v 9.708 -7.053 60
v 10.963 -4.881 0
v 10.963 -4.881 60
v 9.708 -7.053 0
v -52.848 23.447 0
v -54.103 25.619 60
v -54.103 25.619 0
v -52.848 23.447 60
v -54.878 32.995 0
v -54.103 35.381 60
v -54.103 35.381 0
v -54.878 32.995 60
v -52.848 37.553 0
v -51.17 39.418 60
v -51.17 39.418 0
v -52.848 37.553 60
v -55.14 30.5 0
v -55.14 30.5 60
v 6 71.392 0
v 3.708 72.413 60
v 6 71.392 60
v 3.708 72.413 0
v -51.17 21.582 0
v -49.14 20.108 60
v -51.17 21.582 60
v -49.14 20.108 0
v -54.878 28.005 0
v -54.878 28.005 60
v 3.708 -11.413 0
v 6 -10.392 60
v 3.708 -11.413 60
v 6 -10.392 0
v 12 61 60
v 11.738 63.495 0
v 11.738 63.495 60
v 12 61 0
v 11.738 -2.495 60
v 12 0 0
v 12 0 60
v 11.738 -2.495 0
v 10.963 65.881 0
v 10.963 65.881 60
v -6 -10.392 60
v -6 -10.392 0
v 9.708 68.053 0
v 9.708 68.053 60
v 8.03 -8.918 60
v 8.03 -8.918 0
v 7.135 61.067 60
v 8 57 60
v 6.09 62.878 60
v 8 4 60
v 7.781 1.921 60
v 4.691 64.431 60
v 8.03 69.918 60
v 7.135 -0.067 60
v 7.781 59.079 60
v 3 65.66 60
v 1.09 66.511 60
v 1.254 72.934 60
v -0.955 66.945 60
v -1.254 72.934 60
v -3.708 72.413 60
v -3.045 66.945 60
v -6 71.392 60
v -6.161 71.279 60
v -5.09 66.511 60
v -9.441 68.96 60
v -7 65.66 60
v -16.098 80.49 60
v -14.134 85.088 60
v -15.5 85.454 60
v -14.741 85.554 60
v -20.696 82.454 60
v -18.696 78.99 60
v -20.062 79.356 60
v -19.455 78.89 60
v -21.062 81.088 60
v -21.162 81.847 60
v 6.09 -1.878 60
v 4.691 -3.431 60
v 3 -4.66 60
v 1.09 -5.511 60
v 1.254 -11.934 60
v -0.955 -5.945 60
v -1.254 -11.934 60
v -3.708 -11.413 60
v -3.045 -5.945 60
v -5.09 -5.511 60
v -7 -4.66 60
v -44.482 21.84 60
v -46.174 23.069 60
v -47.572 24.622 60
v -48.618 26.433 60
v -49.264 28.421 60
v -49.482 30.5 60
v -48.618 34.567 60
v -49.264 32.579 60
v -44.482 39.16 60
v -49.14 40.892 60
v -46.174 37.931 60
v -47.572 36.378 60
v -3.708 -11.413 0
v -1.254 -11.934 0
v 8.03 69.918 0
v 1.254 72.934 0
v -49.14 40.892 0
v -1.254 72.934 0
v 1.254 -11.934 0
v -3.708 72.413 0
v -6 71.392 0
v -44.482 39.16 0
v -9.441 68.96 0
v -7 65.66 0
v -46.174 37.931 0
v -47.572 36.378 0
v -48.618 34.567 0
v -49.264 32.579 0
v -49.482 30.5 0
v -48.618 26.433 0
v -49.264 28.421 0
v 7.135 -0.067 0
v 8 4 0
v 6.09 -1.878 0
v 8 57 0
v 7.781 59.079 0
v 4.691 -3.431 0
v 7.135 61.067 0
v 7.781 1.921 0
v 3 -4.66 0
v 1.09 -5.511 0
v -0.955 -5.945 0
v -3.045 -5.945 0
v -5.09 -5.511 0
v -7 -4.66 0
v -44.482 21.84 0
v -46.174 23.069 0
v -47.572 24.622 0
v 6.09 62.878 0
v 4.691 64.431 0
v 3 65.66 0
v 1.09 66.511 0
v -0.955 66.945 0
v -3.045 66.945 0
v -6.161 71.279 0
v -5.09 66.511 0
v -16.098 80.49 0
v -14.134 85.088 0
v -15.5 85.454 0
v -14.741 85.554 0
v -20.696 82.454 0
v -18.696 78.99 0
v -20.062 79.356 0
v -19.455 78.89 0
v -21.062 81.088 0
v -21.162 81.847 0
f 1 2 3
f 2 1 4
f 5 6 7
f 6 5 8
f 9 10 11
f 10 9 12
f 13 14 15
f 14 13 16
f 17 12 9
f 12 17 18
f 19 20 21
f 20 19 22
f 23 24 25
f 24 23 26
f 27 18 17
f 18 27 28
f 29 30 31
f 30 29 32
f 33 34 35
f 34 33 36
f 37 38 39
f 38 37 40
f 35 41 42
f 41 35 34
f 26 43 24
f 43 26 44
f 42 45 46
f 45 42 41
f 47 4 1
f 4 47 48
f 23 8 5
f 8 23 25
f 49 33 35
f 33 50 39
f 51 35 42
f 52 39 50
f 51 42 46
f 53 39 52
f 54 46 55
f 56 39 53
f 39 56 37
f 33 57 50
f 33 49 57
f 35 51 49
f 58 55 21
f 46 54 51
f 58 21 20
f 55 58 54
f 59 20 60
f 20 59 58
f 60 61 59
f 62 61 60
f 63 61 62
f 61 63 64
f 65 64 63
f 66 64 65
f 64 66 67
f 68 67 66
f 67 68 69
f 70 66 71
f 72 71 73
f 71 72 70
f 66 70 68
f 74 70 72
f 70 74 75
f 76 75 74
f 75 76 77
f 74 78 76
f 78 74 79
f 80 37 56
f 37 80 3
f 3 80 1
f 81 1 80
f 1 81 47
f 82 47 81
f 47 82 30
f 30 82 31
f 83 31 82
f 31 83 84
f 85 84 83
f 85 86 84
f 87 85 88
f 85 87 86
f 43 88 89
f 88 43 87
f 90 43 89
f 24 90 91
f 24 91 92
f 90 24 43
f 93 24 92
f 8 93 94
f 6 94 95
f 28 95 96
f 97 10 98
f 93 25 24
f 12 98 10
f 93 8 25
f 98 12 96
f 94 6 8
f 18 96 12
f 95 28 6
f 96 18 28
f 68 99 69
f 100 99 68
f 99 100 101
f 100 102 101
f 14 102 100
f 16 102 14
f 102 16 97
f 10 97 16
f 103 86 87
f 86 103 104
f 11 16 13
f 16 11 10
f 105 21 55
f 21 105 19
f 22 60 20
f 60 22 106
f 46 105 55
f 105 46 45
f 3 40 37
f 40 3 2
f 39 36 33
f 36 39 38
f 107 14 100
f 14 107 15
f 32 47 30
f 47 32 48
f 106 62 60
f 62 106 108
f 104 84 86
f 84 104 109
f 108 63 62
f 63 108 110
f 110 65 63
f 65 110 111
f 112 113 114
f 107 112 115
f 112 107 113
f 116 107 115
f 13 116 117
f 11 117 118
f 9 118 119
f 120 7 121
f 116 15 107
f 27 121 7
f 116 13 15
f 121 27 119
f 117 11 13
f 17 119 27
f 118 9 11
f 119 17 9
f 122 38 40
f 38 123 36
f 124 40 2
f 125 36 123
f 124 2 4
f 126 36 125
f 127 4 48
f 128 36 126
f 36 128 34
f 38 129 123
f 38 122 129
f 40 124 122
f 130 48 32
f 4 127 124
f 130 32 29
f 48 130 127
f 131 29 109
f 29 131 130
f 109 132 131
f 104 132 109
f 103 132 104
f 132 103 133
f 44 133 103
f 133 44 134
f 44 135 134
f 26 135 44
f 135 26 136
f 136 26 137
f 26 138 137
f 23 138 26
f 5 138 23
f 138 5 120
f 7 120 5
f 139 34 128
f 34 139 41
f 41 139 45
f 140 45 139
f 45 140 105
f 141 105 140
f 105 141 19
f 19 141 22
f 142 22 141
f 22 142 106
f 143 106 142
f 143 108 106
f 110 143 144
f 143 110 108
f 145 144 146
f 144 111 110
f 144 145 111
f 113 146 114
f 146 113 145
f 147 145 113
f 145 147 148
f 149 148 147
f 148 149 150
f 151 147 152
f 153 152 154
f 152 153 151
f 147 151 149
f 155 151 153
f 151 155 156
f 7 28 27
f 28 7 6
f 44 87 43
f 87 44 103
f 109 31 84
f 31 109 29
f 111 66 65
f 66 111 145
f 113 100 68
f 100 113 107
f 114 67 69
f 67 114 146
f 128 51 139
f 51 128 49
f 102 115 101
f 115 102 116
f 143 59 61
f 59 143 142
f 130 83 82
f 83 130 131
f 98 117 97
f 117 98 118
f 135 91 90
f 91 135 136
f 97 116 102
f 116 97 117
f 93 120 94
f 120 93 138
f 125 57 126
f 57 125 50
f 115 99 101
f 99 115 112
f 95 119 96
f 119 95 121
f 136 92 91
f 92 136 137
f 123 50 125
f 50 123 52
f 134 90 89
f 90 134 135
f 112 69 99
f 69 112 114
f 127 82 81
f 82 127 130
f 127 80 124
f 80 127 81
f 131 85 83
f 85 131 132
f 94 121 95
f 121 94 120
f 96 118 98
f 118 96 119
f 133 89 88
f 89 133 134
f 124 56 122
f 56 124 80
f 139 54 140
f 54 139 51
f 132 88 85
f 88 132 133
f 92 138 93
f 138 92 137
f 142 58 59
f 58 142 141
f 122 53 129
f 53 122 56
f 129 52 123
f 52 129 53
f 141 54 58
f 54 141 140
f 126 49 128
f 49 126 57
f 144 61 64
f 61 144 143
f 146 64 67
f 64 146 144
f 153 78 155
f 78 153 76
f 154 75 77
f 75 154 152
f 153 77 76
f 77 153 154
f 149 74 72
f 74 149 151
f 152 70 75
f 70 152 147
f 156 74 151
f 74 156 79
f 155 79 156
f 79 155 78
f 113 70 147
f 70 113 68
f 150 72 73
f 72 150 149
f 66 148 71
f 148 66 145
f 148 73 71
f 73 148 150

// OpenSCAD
// width across the front (z height as printed)
width = 60;
// width of the end
endSize = 85;
// thickness of your phone + case
shelfDepth = 13;
// height of the lip to hold the phone in place
shelfLip = 4;
// thickness of walls
thickness = 2;
// roundness
outerRadius = 12;

module roundedEquilateralTriangularPrism(endSize, width, r) {
	endHeight = endSize / 1.414;
	w = width - 1;
	minkowski() {
		polyhedron(
		   points=[[0,0,0], [w,0,0], [w,endSize,0], [0,endSize,0], [0,endSize / 2,endHeight], [w,endSize / 2,endHeight]],
		   faces=[[0,1,2,3],[5,4,3,2],[0,4,5,1],[0,3,4],[5,2,1]] );
		rotate([0, 90, 0])
			cylinder(r=r, h=1);
	}
}

module roundedShelf(stickout, lip) {
	minkowski() {
		union() {
			translate([0, stickout, thickness])
				cube([width - 1, thickness, lip]);
			cube([width - 1, stickout + thickness, thickness]);
		}
		rotate([0, 90, 0])
			cylinder(r=thickness / 2, h=1, $fn=8);
	}
}

// phone stand
rotate([0, -90, 0]) // rotate to print
union() {
	innerOffset = thickness * 2;
	difference() {
		roundedEquilateralTriangularPrism(endSize - outerRadius * 2, width, outerRadius);
		translate([-1, innerOffset, thickness])
			roundedEquilateralTriangularPrism(endSize - outerRadius * 2 - thickness * 4, width + 2, outerRadius - thickness);
	}
	translate([0, endSize - outerRadius - thickness * 2, outerRadius / 2])
		rotate([30, 0, 0])
			roundedShelf(shelfDepth + thickness * 1.5, shelfLip);
}

// model of phone with case, in position (comment out the "rotate to print" line to see alignment)
//~ color("DimGray", 1)
	//~ translate([-10, endSize - outerRadius - 4, 10])
		//~ rotate([30, 0, 0])
			//~ cube([80, 13, 150]);
